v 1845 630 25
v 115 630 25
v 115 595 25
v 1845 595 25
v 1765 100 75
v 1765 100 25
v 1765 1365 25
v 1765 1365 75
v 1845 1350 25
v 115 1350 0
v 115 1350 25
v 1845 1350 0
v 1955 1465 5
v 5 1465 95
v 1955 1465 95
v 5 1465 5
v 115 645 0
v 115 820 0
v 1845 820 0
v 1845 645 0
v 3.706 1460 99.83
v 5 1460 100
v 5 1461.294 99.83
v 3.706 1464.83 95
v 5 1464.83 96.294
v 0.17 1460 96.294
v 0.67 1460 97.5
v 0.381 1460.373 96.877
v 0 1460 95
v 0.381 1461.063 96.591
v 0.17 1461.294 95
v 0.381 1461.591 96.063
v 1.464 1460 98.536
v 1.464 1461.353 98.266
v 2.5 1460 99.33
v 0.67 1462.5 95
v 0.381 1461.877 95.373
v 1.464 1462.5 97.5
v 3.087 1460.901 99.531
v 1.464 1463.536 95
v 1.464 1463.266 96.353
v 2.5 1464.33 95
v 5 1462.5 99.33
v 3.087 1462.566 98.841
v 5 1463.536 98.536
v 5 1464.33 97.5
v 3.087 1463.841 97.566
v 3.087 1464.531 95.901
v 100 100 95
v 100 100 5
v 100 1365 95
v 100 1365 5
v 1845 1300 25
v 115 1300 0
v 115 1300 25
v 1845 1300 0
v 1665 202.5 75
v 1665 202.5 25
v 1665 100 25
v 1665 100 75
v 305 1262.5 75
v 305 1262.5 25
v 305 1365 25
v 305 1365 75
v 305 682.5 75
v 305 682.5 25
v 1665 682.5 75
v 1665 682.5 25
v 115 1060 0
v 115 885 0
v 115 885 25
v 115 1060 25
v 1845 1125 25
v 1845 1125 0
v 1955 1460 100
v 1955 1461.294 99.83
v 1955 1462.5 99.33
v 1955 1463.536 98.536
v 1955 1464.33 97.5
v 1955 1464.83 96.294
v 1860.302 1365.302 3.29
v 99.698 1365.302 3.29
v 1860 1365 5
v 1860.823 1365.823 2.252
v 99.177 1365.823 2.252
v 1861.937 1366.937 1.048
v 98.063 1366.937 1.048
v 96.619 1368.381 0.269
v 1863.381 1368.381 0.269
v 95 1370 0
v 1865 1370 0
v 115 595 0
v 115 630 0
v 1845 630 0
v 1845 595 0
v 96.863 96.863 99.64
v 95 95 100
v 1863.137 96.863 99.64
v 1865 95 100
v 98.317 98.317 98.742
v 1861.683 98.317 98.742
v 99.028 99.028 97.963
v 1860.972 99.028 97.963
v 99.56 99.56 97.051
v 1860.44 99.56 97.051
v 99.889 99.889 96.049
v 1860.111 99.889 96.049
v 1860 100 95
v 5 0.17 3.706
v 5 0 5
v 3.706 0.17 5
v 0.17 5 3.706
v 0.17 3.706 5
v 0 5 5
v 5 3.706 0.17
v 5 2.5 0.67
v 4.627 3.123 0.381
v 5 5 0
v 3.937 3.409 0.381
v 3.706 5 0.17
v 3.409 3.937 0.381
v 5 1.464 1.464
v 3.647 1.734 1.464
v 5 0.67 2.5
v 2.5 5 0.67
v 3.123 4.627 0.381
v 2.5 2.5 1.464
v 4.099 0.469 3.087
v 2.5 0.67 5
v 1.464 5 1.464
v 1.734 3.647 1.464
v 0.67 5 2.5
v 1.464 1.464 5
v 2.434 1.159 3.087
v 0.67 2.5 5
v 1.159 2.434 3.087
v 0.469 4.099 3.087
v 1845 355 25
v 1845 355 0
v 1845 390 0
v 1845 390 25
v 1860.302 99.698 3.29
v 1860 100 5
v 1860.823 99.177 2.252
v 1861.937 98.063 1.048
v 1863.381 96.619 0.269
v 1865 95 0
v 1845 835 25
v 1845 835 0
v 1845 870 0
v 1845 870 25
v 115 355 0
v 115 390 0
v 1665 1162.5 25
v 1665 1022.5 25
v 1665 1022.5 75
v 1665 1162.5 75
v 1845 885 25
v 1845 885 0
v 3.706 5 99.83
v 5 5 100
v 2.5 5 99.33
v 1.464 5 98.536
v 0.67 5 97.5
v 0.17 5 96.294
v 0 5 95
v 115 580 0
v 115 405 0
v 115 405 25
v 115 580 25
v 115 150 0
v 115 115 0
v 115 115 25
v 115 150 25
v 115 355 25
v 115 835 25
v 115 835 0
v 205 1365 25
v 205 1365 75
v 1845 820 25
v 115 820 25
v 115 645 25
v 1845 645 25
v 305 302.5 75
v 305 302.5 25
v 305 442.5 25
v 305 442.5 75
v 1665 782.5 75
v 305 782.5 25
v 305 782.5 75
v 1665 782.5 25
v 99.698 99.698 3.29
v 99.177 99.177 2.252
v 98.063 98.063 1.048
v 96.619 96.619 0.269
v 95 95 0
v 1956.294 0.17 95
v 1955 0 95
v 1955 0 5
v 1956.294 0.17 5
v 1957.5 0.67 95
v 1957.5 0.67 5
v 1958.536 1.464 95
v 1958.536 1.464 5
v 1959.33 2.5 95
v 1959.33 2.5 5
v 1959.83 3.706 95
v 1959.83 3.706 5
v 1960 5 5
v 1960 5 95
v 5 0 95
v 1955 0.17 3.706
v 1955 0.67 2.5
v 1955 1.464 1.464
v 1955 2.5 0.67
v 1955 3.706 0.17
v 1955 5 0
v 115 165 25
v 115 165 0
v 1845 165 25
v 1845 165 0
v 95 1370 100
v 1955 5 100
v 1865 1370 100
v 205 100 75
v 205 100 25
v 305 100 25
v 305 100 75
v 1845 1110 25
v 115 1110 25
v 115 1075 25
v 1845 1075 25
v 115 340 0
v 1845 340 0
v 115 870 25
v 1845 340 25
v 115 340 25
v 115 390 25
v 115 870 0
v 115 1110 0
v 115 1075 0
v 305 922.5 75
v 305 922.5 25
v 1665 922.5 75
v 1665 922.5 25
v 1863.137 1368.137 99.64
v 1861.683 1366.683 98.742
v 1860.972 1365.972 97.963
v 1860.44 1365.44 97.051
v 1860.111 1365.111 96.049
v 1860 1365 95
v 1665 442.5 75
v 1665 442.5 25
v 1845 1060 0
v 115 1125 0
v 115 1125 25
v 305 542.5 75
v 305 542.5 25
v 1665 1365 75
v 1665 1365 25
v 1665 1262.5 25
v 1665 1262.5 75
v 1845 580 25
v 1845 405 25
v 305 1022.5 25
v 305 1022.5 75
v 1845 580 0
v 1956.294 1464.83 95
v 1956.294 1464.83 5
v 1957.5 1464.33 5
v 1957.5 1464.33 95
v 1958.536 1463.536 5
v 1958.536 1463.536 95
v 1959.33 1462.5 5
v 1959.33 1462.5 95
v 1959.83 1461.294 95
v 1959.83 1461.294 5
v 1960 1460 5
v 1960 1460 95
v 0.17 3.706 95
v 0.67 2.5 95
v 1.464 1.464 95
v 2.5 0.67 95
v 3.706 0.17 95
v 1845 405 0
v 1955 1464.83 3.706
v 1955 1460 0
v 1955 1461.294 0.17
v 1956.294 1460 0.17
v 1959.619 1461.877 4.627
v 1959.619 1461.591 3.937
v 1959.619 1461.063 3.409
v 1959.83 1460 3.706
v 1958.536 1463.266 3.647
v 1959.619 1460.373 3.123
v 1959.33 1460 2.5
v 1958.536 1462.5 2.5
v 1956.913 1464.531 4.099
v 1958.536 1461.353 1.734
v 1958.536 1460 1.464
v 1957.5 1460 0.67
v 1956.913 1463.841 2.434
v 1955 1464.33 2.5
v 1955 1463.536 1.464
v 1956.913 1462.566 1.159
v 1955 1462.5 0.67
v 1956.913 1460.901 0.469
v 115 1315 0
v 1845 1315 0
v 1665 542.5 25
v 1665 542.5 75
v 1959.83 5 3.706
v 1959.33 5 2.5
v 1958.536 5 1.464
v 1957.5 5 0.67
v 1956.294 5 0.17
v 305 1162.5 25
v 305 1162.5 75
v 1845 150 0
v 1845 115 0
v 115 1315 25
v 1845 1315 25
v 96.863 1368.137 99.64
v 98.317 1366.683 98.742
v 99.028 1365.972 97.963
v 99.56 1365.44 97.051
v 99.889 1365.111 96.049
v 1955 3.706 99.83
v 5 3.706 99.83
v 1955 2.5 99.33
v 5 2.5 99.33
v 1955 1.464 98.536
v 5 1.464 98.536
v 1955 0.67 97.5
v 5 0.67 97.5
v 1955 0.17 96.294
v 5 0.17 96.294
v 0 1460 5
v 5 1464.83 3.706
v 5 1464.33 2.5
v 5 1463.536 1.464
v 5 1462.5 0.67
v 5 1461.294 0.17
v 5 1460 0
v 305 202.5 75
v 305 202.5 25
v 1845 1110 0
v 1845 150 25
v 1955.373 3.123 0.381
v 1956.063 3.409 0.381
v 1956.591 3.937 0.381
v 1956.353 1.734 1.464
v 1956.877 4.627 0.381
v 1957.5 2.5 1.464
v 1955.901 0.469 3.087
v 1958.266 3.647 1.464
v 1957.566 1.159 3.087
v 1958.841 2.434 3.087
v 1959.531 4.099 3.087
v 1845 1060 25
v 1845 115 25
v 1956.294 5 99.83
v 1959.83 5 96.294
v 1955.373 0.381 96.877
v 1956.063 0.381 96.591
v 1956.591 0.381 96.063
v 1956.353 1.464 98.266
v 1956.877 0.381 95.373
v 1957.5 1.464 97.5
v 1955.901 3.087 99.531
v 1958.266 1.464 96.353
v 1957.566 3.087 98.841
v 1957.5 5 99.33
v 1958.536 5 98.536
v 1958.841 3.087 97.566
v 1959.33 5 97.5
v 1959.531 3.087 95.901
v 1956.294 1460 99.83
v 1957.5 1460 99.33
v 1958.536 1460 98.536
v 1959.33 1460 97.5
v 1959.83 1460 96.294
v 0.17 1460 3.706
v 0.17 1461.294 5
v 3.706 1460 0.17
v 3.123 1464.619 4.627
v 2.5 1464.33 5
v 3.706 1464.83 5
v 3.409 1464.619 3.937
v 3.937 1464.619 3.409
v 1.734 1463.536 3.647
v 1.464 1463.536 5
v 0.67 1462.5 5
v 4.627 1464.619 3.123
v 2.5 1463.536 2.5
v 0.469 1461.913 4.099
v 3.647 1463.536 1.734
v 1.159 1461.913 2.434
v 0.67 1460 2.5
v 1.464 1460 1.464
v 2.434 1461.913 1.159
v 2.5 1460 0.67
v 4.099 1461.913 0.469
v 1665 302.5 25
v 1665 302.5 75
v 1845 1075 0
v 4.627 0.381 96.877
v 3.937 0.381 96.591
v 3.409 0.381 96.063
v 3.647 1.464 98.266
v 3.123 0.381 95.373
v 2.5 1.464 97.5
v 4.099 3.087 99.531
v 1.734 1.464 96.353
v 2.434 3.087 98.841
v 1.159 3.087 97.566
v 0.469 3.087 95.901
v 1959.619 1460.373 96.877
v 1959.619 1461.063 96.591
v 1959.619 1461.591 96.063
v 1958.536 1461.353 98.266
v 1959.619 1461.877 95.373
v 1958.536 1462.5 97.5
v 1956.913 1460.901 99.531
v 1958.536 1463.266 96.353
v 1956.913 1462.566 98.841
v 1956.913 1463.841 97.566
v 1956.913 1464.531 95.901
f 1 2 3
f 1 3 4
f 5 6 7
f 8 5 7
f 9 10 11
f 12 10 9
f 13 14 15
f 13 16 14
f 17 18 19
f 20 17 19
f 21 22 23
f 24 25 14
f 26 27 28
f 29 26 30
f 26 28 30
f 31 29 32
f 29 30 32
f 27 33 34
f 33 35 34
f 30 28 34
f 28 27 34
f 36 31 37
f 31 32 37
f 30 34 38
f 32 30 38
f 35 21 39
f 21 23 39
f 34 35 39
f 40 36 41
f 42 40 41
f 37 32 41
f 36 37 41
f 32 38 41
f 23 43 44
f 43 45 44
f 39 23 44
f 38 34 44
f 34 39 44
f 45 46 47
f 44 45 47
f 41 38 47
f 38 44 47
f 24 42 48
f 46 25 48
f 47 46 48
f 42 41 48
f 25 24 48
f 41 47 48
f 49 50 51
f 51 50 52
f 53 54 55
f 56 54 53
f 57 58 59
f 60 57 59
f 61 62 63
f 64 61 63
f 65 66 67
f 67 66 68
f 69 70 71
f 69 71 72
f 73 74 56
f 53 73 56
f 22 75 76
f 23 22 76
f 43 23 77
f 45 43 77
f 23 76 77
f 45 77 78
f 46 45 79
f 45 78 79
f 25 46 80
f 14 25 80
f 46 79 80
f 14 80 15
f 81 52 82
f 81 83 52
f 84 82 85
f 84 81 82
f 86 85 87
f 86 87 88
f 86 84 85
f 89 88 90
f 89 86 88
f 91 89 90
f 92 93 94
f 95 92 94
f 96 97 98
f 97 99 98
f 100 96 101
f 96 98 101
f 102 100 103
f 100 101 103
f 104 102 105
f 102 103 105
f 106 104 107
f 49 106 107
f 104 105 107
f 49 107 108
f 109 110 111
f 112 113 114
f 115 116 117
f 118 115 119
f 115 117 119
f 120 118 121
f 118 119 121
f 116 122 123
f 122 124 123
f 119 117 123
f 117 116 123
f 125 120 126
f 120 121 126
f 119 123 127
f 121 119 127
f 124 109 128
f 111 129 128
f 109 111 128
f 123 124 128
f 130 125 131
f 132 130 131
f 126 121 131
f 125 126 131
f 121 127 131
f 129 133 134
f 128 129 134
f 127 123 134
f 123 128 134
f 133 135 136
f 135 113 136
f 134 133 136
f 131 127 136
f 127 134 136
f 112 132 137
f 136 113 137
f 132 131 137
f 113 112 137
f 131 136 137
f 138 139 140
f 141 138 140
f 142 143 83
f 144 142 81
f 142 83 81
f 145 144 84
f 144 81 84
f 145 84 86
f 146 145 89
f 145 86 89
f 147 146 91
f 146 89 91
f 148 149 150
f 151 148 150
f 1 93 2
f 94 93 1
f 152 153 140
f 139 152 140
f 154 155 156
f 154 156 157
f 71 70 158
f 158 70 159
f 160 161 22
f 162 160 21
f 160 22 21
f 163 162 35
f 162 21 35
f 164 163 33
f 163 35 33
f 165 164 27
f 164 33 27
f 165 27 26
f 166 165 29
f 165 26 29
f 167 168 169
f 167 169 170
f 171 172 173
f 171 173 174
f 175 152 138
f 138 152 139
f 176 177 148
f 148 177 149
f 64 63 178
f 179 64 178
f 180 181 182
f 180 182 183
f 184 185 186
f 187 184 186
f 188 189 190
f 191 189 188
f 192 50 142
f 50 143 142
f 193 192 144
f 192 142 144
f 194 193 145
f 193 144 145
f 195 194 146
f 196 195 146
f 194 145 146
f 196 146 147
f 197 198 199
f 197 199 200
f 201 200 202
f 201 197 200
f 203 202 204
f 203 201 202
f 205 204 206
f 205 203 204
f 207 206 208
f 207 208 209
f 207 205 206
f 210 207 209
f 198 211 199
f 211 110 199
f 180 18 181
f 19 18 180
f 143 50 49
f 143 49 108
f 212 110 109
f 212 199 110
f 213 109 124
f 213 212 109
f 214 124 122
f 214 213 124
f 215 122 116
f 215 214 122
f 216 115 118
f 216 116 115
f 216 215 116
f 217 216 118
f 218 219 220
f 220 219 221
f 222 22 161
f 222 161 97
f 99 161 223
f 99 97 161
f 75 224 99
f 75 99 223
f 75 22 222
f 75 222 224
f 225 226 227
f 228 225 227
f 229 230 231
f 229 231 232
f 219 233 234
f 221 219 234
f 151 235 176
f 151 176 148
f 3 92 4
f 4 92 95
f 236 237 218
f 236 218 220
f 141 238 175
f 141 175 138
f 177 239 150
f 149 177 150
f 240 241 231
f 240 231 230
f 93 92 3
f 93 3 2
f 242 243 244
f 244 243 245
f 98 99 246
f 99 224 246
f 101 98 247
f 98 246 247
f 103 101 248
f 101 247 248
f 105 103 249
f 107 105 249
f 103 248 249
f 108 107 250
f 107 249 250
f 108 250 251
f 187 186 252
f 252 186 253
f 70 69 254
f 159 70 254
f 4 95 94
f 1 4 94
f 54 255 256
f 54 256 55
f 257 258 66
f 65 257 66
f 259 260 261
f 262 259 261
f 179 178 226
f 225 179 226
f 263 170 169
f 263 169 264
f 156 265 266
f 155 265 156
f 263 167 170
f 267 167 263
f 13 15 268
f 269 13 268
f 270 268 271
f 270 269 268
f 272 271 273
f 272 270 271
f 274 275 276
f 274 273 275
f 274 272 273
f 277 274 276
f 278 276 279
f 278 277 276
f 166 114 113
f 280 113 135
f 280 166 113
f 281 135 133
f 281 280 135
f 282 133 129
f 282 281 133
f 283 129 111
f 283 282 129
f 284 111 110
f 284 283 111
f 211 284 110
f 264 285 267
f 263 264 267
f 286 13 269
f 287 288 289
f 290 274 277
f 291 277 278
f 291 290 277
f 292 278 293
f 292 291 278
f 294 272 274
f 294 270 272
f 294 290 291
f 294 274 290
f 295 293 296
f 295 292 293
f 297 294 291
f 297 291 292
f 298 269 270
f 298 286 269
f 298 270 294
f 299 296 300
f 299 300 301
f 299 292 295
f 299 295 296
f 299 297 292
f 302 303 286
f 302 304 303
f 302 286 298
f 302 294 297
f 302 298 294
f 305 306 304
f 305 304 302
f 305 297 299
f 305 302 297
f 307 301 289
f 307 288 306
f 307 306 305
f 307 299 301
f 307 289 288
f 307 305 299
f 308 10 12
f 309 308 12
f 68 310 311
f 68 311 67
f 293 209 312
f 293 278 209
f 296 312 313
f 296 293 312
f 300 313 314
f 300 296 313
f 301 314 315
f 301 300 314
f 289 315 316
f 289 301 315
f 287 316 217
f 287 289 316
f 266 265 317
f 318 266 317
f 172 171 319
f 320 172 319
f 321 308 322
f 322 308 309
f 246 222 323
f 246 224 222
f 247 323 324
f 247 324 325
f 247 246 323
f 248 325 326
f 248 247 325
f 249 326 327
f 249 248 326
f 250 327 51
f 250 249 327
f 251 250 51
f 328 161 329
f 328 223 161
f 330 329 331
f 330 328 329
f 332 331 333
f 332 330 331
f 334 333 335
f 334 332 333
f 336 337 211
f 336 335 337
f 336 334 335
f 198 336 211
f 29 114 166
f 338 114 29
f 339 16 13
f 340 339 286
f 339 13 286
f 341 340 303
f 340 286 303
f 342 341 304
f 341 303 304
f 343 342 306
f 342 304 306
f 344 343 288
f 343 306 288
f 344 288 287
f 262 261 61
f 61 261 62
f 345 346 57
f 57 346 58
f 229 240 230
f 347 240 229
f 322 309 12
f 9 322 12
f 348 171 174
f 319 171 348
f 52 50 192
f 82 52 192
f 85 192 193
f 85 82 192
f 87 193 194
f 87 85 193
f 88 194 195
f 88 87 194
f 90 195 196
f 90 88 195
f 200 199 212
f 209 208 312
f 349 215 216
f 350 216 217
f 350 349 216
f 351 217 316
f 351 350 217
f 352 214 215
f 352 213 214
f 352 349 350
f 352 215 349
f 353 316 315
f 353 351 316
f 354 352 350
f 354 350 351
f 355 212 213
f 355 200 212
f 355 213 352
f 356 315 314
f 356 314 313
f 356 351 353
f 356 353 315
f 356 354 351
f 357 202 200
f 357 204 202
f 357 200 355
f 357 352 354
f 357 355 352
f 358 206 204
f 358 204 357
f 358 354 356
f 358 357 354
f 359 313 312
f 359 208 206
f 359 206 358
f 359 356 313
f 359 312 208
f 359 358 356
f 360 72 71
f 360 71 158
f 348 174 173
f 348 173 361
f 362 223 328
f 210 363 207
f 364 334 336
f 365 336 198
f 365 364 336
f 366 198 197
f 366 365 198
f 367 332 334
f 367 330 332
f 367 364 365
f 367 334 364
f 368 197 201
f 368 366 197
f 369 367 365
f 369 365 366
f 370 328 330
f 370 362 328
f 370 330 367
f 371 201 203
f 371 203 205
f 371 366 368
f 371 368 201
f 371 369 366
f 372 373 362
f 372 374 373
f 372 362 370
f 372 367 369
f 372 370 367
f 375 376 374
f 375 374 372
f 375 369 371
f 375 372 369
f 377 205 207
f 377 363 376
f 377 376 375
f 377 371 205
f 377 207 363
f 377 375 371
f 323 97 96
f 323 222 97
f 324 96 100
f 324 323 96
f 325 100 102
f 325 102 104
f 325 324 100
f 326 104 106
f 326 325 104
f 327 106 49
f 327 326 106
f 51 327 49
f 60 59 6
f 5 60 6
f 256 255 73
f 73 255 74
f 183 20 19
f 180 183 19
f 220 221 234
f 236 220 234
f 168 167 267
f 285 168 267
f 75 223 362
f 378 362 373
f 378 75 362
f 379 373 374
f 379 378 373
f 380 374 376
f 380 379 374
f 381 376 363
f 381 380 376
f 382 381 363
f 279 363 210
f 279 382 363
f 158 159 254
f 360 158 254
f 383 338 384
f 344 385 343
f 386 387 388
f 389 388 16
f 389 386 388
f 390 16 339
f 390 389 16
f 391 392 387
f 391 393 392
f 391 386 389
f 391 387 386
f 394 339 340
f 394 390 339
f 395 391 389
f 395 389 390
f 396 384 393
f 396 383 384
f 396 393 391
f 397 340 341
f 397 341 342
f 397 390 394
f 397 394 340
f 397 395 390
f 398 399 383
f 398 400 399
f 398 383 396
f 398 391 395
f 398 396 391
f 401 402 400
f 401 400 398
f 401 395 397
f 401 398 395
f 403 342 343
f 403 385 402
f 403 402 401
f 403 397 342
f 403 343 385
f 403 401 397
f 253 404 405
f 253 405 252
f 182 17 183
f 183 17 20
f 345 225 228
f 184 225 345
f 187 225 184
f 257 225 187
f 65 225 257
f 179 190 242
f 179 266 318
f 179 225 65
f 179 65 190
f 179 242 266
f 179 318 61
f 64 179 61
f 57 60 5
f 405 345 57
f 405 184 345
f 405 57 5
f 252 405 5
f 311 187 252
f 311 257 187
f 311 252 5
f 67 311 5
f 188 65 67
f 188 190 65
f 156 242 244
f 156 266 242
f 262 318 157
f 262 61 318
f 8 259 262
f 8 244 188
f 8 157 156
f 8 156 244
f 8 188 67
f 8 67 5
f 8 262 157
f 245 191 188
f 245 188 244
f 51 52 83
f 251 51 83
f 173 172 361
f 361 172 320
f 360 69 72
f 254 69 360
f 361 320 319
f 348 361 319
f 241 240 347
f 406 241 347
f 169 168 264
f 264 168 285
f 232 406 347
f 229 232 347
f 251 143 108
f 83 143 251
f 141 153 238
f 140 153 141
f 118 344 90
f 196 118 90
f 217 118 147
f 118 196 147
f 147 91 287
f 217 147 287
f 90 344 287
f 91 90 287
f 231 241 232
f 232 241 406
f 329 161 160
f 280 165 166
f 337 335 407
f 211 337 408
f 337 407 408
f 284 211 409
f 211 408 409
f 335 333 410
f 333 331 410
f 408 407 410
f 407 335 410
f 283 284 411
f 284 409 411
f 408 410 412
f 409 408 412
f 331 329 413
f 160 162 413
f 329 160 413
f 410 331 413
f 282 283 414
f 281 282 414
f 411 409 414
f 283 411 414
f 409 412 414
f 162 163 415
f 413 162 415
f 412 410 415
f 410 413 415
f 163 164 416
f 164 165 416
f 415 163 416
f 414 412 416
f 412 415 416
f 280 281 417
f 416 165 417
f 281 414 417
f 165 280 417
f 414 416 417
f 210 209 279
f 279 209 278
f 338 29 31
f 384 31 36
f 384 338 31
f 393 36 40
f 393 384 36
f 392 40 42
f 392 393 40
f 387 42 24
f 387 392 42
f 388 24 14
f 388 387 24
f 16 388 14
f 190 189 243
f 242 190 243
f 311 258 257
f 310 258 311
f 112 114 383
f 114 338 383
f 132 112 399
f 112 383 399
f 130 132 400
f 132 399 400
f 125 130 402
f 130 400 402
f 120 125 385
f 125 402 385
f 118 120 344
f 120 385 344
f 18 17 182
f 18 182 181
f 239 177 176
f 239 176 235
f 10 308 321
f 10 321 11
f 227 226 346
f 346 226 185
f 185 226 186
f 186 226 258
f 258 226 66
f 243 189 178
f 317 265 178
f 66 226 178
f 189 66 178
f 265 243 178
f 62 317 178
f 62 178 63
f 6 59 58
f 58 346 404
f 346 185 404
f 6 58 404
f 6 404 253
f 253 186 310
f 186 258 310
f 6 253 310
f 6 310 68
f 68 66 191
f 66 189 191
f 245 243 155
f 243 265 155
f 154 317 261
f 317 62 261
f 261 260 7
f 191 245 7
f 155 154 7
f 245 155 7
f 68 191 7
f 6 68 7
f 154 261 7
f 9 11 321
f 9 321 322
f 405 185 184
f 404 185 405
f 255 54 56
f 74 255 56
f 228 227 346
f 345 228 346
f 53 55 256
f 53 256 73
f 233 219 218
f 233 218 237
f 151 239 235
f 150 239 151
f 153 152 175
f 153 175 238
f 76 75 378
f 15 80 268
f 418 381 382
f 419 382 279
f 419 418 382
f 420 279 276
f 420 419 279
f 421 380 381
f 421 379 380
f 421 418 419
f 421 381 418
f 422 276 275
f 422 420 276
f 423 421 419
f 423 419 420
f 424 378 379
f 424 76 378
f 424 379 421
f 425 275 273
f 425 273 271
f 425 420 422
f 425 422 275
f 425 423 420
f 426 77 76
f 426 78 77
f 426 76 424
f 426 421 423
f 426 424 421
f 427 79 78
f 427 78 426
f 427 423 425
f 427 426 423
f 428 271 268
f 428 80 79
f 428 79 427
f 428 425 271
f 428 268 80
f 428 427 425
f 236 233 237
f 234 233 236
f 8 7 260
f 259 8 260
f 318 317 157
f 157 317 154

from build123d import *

# Parameters (mm, degrees)
F0_W     = 1960
F0_H     = 1465
F0_W_2   = 1760
F0_H_2   = 1265
F1_DEPTH = 100
F2_DEPTH = 25
F0_W_3   = 1730
F0_H_3   = 175
F0_H_4   = 35
F3_R     = 5
F4_R     = 5
F5_W     = 1360
F5_H     = 140
F6_DEPTH = 50


# Not quite as in the source:
# - a feature names something its author has since deleted; it is built from what else it names


with BuildPart() as f1:
    # F0 (on Top) → F1 (new body)
    with BuildSketch(Plane.XY):
        with Locations((980, 732.5)):
            Rectangle(F0_W, F0_H)
        with Locations((980, 732.5)):
            Rectangle(F0_W_2, F0_H_2, mode=Mode.SUBTRACT)
    extrude(amount=F1_DEPTH)

    # F0 (on Top) → F2 (join)
    with BuildSketch(Plane.XY):
        with Locations((980, 732.5)):
            Rectangle(F0_W, F0_H)
        with Locations((980, 732.5)):
            Rectangle(F0_W_2, F0_H_2, mode=Mode.SUBTRACT)
    extrude(amount=F2_DEPTH)

    # F3
    f3_edges = [f1.edges().sort_by_distance(p)[0] for p in [
        (980, 1365, 100),
        (100, 732.5, 100),
        (980, 100, 100),
        (1860, 732.5, 100),
    ]]
    fillet(f3_edges, radius=F3_R)

    # F4
    f4_edges = [f1.edges().sort_by_distance(p)[0] for p in [
        (980, 1465, 100),
        (0, 732.5, 100),
        (1960, 732.5, 100),
        (980, 0, 100),
        (1960, 0, 50),
        (0, 0, 50),
        (980, 0, 0),
        (0, 732.5, 0),
        (0, 1465, 50),
        (980, 1465, 0),
        (1960, 1465, 50),
        (1960, 732.5, 0),
        (100, 732.5, 0),
        (980, 1365, 0),
        (980, 100, 0),
        (1860, 732.5, 0),
    ]]
    fillet(f4_edges, radius=F4_R)


with BuildPart() as f2:
    # F0 (on Top) → F2, piece 2 (new body)
    with BuildSketch(Plane.XY):
        with Locations((980, 1212.5)):
            Rectangle(F0_W_3, F0_H_3)
    extrude(amount=F2_DEPTH)


with BuildPart() as f2b:
    # F0 (on Top) → F2, piece 3 (new body)
    with BuildSketch(Plane.XY):
        with Locations((980, 972.5)):
            Rectangle(F0_W_3, F0_H_3)
    extrude(amount=F2_DEPTH)


with BuildPart() as f2c:
    # F0 (on Top) → F2, piece 4 (new body)
    with BuildSketch(Plane.XY):
        with Locations((980, 732.5)):
            Rectangle(F0_W_3, F0_H_3)
    extrude(amount=F2_DEPTH)


with BuildPart() as f2d:
    # F0 (on Top) → F2, piece 5 (new body)
    with BuildSketch(Plane.XY):
        with Locations((980, 492.5)):
            Rectangle(F0_W_3, F0_H_3)
    extrude(amount=F2_DEPTH)


with BuildPart() as f2e:
    # F0 (on Top) → F2, piece 6 (new body)
    with BuildSketch(Plane.XY):
        with Locations((980, 252.5)):
            Rectangle(F0_W_3, F0_H_3)
    extrude(amount=F2_DEPTH)


with BuildPart() as f2f:
    # F0 (on Top) → F2, piece 7 (new body)
    with BuildSketch(Plane.XY):
        with Locations((980, 132.5)):
            Rectangle(F0_W_3, F0_H_4)
    extrude(amount=F2_DEPTH)


with BuildPart() as f2g:
    # F0 (on Top) → F2, piece 8 (new body)
    with BuildSketch(Plane.XY):
        with Locations((980, 372.5)):
            Rectangle(F0_W_3, F0_H_4)
    extrude(amount=F2_DEPTH)


with BuildPart() as f2h:
    # F0 (on Top) → F2, piece 9 (new body)
    with BuildSketch(Plane.XY):
        with Locations((980, 612.5)):
            Rectangle(F0_W_3, F0_H_4)
    extrude(amount=F2_DEPTH)


with BuildPart() as f2i:
    # F0 (on Top) → F2, piece 10 (new body)
    with BuildSketch(Plane.XY):
        with Locations((980, 852.5)):
            Rectangle(F0_W_3, F0_H_4)
    extrude(amount=F2_DEPTH)


with BuildPart() as f2j:
    # F0 (on Top) → F2, piece 11 (new body)
    with BuildSketch(Plane.XY):
        with Locations((980, 1092.5)):
            Rectangle(F0_W_3, F0_H_4)
    extrude(amount=F2_DEPTH)


with BuildPart() as f2k:
    # F0 (on Top) → F2, piece 12 (new body)
    with BuildSketch(Plane.XY):
        with Locations((980, 1332.5)):
            Rectangle(F0_W_3, F0_H_4)
    extrude(amount=F2_DEPTH)


with BuildPart() as f6:
    # F5 (on face) → F6 (new body)
    with BuildSketch(Plane.XY.offset(25)):
        Polygon((205, 1365), (205, 100), (305, 100), (305, 202.5), (1665, 202.5), (1665, 100), (1765, 100), (1765, 1365), (1665, 1365), (1665, 1262.5), (305, 1262.5), (305, 1365), align=None)
        with Locations((985, 372.5)):
            Rectangle(F5_W, F5_H, mode=Mode.SUBTRACT)
        with Locations((985, 612.5)):
            Rectangle(F5_W, F5_H, mode=Mode.SUBTRACT)
        with Locations((985, 852.5)):
            Rectangle(F5_W, F5_H, mode=Mode.SUBTRACT)
        with Locations((985, 1092.5)):
            Rectangle(F5_W, F5_H, mode=Mode.SUBTRACT)
    extrude(amount=F6_DEPTH)


solid = Compound([f1.part, f2.part, f2b.part, f2c.part, f2d.part, f2e.part, f2f.part, f2g.part, f2h.part, f2i.part, f2j.part, f2k.part, f6.part])
